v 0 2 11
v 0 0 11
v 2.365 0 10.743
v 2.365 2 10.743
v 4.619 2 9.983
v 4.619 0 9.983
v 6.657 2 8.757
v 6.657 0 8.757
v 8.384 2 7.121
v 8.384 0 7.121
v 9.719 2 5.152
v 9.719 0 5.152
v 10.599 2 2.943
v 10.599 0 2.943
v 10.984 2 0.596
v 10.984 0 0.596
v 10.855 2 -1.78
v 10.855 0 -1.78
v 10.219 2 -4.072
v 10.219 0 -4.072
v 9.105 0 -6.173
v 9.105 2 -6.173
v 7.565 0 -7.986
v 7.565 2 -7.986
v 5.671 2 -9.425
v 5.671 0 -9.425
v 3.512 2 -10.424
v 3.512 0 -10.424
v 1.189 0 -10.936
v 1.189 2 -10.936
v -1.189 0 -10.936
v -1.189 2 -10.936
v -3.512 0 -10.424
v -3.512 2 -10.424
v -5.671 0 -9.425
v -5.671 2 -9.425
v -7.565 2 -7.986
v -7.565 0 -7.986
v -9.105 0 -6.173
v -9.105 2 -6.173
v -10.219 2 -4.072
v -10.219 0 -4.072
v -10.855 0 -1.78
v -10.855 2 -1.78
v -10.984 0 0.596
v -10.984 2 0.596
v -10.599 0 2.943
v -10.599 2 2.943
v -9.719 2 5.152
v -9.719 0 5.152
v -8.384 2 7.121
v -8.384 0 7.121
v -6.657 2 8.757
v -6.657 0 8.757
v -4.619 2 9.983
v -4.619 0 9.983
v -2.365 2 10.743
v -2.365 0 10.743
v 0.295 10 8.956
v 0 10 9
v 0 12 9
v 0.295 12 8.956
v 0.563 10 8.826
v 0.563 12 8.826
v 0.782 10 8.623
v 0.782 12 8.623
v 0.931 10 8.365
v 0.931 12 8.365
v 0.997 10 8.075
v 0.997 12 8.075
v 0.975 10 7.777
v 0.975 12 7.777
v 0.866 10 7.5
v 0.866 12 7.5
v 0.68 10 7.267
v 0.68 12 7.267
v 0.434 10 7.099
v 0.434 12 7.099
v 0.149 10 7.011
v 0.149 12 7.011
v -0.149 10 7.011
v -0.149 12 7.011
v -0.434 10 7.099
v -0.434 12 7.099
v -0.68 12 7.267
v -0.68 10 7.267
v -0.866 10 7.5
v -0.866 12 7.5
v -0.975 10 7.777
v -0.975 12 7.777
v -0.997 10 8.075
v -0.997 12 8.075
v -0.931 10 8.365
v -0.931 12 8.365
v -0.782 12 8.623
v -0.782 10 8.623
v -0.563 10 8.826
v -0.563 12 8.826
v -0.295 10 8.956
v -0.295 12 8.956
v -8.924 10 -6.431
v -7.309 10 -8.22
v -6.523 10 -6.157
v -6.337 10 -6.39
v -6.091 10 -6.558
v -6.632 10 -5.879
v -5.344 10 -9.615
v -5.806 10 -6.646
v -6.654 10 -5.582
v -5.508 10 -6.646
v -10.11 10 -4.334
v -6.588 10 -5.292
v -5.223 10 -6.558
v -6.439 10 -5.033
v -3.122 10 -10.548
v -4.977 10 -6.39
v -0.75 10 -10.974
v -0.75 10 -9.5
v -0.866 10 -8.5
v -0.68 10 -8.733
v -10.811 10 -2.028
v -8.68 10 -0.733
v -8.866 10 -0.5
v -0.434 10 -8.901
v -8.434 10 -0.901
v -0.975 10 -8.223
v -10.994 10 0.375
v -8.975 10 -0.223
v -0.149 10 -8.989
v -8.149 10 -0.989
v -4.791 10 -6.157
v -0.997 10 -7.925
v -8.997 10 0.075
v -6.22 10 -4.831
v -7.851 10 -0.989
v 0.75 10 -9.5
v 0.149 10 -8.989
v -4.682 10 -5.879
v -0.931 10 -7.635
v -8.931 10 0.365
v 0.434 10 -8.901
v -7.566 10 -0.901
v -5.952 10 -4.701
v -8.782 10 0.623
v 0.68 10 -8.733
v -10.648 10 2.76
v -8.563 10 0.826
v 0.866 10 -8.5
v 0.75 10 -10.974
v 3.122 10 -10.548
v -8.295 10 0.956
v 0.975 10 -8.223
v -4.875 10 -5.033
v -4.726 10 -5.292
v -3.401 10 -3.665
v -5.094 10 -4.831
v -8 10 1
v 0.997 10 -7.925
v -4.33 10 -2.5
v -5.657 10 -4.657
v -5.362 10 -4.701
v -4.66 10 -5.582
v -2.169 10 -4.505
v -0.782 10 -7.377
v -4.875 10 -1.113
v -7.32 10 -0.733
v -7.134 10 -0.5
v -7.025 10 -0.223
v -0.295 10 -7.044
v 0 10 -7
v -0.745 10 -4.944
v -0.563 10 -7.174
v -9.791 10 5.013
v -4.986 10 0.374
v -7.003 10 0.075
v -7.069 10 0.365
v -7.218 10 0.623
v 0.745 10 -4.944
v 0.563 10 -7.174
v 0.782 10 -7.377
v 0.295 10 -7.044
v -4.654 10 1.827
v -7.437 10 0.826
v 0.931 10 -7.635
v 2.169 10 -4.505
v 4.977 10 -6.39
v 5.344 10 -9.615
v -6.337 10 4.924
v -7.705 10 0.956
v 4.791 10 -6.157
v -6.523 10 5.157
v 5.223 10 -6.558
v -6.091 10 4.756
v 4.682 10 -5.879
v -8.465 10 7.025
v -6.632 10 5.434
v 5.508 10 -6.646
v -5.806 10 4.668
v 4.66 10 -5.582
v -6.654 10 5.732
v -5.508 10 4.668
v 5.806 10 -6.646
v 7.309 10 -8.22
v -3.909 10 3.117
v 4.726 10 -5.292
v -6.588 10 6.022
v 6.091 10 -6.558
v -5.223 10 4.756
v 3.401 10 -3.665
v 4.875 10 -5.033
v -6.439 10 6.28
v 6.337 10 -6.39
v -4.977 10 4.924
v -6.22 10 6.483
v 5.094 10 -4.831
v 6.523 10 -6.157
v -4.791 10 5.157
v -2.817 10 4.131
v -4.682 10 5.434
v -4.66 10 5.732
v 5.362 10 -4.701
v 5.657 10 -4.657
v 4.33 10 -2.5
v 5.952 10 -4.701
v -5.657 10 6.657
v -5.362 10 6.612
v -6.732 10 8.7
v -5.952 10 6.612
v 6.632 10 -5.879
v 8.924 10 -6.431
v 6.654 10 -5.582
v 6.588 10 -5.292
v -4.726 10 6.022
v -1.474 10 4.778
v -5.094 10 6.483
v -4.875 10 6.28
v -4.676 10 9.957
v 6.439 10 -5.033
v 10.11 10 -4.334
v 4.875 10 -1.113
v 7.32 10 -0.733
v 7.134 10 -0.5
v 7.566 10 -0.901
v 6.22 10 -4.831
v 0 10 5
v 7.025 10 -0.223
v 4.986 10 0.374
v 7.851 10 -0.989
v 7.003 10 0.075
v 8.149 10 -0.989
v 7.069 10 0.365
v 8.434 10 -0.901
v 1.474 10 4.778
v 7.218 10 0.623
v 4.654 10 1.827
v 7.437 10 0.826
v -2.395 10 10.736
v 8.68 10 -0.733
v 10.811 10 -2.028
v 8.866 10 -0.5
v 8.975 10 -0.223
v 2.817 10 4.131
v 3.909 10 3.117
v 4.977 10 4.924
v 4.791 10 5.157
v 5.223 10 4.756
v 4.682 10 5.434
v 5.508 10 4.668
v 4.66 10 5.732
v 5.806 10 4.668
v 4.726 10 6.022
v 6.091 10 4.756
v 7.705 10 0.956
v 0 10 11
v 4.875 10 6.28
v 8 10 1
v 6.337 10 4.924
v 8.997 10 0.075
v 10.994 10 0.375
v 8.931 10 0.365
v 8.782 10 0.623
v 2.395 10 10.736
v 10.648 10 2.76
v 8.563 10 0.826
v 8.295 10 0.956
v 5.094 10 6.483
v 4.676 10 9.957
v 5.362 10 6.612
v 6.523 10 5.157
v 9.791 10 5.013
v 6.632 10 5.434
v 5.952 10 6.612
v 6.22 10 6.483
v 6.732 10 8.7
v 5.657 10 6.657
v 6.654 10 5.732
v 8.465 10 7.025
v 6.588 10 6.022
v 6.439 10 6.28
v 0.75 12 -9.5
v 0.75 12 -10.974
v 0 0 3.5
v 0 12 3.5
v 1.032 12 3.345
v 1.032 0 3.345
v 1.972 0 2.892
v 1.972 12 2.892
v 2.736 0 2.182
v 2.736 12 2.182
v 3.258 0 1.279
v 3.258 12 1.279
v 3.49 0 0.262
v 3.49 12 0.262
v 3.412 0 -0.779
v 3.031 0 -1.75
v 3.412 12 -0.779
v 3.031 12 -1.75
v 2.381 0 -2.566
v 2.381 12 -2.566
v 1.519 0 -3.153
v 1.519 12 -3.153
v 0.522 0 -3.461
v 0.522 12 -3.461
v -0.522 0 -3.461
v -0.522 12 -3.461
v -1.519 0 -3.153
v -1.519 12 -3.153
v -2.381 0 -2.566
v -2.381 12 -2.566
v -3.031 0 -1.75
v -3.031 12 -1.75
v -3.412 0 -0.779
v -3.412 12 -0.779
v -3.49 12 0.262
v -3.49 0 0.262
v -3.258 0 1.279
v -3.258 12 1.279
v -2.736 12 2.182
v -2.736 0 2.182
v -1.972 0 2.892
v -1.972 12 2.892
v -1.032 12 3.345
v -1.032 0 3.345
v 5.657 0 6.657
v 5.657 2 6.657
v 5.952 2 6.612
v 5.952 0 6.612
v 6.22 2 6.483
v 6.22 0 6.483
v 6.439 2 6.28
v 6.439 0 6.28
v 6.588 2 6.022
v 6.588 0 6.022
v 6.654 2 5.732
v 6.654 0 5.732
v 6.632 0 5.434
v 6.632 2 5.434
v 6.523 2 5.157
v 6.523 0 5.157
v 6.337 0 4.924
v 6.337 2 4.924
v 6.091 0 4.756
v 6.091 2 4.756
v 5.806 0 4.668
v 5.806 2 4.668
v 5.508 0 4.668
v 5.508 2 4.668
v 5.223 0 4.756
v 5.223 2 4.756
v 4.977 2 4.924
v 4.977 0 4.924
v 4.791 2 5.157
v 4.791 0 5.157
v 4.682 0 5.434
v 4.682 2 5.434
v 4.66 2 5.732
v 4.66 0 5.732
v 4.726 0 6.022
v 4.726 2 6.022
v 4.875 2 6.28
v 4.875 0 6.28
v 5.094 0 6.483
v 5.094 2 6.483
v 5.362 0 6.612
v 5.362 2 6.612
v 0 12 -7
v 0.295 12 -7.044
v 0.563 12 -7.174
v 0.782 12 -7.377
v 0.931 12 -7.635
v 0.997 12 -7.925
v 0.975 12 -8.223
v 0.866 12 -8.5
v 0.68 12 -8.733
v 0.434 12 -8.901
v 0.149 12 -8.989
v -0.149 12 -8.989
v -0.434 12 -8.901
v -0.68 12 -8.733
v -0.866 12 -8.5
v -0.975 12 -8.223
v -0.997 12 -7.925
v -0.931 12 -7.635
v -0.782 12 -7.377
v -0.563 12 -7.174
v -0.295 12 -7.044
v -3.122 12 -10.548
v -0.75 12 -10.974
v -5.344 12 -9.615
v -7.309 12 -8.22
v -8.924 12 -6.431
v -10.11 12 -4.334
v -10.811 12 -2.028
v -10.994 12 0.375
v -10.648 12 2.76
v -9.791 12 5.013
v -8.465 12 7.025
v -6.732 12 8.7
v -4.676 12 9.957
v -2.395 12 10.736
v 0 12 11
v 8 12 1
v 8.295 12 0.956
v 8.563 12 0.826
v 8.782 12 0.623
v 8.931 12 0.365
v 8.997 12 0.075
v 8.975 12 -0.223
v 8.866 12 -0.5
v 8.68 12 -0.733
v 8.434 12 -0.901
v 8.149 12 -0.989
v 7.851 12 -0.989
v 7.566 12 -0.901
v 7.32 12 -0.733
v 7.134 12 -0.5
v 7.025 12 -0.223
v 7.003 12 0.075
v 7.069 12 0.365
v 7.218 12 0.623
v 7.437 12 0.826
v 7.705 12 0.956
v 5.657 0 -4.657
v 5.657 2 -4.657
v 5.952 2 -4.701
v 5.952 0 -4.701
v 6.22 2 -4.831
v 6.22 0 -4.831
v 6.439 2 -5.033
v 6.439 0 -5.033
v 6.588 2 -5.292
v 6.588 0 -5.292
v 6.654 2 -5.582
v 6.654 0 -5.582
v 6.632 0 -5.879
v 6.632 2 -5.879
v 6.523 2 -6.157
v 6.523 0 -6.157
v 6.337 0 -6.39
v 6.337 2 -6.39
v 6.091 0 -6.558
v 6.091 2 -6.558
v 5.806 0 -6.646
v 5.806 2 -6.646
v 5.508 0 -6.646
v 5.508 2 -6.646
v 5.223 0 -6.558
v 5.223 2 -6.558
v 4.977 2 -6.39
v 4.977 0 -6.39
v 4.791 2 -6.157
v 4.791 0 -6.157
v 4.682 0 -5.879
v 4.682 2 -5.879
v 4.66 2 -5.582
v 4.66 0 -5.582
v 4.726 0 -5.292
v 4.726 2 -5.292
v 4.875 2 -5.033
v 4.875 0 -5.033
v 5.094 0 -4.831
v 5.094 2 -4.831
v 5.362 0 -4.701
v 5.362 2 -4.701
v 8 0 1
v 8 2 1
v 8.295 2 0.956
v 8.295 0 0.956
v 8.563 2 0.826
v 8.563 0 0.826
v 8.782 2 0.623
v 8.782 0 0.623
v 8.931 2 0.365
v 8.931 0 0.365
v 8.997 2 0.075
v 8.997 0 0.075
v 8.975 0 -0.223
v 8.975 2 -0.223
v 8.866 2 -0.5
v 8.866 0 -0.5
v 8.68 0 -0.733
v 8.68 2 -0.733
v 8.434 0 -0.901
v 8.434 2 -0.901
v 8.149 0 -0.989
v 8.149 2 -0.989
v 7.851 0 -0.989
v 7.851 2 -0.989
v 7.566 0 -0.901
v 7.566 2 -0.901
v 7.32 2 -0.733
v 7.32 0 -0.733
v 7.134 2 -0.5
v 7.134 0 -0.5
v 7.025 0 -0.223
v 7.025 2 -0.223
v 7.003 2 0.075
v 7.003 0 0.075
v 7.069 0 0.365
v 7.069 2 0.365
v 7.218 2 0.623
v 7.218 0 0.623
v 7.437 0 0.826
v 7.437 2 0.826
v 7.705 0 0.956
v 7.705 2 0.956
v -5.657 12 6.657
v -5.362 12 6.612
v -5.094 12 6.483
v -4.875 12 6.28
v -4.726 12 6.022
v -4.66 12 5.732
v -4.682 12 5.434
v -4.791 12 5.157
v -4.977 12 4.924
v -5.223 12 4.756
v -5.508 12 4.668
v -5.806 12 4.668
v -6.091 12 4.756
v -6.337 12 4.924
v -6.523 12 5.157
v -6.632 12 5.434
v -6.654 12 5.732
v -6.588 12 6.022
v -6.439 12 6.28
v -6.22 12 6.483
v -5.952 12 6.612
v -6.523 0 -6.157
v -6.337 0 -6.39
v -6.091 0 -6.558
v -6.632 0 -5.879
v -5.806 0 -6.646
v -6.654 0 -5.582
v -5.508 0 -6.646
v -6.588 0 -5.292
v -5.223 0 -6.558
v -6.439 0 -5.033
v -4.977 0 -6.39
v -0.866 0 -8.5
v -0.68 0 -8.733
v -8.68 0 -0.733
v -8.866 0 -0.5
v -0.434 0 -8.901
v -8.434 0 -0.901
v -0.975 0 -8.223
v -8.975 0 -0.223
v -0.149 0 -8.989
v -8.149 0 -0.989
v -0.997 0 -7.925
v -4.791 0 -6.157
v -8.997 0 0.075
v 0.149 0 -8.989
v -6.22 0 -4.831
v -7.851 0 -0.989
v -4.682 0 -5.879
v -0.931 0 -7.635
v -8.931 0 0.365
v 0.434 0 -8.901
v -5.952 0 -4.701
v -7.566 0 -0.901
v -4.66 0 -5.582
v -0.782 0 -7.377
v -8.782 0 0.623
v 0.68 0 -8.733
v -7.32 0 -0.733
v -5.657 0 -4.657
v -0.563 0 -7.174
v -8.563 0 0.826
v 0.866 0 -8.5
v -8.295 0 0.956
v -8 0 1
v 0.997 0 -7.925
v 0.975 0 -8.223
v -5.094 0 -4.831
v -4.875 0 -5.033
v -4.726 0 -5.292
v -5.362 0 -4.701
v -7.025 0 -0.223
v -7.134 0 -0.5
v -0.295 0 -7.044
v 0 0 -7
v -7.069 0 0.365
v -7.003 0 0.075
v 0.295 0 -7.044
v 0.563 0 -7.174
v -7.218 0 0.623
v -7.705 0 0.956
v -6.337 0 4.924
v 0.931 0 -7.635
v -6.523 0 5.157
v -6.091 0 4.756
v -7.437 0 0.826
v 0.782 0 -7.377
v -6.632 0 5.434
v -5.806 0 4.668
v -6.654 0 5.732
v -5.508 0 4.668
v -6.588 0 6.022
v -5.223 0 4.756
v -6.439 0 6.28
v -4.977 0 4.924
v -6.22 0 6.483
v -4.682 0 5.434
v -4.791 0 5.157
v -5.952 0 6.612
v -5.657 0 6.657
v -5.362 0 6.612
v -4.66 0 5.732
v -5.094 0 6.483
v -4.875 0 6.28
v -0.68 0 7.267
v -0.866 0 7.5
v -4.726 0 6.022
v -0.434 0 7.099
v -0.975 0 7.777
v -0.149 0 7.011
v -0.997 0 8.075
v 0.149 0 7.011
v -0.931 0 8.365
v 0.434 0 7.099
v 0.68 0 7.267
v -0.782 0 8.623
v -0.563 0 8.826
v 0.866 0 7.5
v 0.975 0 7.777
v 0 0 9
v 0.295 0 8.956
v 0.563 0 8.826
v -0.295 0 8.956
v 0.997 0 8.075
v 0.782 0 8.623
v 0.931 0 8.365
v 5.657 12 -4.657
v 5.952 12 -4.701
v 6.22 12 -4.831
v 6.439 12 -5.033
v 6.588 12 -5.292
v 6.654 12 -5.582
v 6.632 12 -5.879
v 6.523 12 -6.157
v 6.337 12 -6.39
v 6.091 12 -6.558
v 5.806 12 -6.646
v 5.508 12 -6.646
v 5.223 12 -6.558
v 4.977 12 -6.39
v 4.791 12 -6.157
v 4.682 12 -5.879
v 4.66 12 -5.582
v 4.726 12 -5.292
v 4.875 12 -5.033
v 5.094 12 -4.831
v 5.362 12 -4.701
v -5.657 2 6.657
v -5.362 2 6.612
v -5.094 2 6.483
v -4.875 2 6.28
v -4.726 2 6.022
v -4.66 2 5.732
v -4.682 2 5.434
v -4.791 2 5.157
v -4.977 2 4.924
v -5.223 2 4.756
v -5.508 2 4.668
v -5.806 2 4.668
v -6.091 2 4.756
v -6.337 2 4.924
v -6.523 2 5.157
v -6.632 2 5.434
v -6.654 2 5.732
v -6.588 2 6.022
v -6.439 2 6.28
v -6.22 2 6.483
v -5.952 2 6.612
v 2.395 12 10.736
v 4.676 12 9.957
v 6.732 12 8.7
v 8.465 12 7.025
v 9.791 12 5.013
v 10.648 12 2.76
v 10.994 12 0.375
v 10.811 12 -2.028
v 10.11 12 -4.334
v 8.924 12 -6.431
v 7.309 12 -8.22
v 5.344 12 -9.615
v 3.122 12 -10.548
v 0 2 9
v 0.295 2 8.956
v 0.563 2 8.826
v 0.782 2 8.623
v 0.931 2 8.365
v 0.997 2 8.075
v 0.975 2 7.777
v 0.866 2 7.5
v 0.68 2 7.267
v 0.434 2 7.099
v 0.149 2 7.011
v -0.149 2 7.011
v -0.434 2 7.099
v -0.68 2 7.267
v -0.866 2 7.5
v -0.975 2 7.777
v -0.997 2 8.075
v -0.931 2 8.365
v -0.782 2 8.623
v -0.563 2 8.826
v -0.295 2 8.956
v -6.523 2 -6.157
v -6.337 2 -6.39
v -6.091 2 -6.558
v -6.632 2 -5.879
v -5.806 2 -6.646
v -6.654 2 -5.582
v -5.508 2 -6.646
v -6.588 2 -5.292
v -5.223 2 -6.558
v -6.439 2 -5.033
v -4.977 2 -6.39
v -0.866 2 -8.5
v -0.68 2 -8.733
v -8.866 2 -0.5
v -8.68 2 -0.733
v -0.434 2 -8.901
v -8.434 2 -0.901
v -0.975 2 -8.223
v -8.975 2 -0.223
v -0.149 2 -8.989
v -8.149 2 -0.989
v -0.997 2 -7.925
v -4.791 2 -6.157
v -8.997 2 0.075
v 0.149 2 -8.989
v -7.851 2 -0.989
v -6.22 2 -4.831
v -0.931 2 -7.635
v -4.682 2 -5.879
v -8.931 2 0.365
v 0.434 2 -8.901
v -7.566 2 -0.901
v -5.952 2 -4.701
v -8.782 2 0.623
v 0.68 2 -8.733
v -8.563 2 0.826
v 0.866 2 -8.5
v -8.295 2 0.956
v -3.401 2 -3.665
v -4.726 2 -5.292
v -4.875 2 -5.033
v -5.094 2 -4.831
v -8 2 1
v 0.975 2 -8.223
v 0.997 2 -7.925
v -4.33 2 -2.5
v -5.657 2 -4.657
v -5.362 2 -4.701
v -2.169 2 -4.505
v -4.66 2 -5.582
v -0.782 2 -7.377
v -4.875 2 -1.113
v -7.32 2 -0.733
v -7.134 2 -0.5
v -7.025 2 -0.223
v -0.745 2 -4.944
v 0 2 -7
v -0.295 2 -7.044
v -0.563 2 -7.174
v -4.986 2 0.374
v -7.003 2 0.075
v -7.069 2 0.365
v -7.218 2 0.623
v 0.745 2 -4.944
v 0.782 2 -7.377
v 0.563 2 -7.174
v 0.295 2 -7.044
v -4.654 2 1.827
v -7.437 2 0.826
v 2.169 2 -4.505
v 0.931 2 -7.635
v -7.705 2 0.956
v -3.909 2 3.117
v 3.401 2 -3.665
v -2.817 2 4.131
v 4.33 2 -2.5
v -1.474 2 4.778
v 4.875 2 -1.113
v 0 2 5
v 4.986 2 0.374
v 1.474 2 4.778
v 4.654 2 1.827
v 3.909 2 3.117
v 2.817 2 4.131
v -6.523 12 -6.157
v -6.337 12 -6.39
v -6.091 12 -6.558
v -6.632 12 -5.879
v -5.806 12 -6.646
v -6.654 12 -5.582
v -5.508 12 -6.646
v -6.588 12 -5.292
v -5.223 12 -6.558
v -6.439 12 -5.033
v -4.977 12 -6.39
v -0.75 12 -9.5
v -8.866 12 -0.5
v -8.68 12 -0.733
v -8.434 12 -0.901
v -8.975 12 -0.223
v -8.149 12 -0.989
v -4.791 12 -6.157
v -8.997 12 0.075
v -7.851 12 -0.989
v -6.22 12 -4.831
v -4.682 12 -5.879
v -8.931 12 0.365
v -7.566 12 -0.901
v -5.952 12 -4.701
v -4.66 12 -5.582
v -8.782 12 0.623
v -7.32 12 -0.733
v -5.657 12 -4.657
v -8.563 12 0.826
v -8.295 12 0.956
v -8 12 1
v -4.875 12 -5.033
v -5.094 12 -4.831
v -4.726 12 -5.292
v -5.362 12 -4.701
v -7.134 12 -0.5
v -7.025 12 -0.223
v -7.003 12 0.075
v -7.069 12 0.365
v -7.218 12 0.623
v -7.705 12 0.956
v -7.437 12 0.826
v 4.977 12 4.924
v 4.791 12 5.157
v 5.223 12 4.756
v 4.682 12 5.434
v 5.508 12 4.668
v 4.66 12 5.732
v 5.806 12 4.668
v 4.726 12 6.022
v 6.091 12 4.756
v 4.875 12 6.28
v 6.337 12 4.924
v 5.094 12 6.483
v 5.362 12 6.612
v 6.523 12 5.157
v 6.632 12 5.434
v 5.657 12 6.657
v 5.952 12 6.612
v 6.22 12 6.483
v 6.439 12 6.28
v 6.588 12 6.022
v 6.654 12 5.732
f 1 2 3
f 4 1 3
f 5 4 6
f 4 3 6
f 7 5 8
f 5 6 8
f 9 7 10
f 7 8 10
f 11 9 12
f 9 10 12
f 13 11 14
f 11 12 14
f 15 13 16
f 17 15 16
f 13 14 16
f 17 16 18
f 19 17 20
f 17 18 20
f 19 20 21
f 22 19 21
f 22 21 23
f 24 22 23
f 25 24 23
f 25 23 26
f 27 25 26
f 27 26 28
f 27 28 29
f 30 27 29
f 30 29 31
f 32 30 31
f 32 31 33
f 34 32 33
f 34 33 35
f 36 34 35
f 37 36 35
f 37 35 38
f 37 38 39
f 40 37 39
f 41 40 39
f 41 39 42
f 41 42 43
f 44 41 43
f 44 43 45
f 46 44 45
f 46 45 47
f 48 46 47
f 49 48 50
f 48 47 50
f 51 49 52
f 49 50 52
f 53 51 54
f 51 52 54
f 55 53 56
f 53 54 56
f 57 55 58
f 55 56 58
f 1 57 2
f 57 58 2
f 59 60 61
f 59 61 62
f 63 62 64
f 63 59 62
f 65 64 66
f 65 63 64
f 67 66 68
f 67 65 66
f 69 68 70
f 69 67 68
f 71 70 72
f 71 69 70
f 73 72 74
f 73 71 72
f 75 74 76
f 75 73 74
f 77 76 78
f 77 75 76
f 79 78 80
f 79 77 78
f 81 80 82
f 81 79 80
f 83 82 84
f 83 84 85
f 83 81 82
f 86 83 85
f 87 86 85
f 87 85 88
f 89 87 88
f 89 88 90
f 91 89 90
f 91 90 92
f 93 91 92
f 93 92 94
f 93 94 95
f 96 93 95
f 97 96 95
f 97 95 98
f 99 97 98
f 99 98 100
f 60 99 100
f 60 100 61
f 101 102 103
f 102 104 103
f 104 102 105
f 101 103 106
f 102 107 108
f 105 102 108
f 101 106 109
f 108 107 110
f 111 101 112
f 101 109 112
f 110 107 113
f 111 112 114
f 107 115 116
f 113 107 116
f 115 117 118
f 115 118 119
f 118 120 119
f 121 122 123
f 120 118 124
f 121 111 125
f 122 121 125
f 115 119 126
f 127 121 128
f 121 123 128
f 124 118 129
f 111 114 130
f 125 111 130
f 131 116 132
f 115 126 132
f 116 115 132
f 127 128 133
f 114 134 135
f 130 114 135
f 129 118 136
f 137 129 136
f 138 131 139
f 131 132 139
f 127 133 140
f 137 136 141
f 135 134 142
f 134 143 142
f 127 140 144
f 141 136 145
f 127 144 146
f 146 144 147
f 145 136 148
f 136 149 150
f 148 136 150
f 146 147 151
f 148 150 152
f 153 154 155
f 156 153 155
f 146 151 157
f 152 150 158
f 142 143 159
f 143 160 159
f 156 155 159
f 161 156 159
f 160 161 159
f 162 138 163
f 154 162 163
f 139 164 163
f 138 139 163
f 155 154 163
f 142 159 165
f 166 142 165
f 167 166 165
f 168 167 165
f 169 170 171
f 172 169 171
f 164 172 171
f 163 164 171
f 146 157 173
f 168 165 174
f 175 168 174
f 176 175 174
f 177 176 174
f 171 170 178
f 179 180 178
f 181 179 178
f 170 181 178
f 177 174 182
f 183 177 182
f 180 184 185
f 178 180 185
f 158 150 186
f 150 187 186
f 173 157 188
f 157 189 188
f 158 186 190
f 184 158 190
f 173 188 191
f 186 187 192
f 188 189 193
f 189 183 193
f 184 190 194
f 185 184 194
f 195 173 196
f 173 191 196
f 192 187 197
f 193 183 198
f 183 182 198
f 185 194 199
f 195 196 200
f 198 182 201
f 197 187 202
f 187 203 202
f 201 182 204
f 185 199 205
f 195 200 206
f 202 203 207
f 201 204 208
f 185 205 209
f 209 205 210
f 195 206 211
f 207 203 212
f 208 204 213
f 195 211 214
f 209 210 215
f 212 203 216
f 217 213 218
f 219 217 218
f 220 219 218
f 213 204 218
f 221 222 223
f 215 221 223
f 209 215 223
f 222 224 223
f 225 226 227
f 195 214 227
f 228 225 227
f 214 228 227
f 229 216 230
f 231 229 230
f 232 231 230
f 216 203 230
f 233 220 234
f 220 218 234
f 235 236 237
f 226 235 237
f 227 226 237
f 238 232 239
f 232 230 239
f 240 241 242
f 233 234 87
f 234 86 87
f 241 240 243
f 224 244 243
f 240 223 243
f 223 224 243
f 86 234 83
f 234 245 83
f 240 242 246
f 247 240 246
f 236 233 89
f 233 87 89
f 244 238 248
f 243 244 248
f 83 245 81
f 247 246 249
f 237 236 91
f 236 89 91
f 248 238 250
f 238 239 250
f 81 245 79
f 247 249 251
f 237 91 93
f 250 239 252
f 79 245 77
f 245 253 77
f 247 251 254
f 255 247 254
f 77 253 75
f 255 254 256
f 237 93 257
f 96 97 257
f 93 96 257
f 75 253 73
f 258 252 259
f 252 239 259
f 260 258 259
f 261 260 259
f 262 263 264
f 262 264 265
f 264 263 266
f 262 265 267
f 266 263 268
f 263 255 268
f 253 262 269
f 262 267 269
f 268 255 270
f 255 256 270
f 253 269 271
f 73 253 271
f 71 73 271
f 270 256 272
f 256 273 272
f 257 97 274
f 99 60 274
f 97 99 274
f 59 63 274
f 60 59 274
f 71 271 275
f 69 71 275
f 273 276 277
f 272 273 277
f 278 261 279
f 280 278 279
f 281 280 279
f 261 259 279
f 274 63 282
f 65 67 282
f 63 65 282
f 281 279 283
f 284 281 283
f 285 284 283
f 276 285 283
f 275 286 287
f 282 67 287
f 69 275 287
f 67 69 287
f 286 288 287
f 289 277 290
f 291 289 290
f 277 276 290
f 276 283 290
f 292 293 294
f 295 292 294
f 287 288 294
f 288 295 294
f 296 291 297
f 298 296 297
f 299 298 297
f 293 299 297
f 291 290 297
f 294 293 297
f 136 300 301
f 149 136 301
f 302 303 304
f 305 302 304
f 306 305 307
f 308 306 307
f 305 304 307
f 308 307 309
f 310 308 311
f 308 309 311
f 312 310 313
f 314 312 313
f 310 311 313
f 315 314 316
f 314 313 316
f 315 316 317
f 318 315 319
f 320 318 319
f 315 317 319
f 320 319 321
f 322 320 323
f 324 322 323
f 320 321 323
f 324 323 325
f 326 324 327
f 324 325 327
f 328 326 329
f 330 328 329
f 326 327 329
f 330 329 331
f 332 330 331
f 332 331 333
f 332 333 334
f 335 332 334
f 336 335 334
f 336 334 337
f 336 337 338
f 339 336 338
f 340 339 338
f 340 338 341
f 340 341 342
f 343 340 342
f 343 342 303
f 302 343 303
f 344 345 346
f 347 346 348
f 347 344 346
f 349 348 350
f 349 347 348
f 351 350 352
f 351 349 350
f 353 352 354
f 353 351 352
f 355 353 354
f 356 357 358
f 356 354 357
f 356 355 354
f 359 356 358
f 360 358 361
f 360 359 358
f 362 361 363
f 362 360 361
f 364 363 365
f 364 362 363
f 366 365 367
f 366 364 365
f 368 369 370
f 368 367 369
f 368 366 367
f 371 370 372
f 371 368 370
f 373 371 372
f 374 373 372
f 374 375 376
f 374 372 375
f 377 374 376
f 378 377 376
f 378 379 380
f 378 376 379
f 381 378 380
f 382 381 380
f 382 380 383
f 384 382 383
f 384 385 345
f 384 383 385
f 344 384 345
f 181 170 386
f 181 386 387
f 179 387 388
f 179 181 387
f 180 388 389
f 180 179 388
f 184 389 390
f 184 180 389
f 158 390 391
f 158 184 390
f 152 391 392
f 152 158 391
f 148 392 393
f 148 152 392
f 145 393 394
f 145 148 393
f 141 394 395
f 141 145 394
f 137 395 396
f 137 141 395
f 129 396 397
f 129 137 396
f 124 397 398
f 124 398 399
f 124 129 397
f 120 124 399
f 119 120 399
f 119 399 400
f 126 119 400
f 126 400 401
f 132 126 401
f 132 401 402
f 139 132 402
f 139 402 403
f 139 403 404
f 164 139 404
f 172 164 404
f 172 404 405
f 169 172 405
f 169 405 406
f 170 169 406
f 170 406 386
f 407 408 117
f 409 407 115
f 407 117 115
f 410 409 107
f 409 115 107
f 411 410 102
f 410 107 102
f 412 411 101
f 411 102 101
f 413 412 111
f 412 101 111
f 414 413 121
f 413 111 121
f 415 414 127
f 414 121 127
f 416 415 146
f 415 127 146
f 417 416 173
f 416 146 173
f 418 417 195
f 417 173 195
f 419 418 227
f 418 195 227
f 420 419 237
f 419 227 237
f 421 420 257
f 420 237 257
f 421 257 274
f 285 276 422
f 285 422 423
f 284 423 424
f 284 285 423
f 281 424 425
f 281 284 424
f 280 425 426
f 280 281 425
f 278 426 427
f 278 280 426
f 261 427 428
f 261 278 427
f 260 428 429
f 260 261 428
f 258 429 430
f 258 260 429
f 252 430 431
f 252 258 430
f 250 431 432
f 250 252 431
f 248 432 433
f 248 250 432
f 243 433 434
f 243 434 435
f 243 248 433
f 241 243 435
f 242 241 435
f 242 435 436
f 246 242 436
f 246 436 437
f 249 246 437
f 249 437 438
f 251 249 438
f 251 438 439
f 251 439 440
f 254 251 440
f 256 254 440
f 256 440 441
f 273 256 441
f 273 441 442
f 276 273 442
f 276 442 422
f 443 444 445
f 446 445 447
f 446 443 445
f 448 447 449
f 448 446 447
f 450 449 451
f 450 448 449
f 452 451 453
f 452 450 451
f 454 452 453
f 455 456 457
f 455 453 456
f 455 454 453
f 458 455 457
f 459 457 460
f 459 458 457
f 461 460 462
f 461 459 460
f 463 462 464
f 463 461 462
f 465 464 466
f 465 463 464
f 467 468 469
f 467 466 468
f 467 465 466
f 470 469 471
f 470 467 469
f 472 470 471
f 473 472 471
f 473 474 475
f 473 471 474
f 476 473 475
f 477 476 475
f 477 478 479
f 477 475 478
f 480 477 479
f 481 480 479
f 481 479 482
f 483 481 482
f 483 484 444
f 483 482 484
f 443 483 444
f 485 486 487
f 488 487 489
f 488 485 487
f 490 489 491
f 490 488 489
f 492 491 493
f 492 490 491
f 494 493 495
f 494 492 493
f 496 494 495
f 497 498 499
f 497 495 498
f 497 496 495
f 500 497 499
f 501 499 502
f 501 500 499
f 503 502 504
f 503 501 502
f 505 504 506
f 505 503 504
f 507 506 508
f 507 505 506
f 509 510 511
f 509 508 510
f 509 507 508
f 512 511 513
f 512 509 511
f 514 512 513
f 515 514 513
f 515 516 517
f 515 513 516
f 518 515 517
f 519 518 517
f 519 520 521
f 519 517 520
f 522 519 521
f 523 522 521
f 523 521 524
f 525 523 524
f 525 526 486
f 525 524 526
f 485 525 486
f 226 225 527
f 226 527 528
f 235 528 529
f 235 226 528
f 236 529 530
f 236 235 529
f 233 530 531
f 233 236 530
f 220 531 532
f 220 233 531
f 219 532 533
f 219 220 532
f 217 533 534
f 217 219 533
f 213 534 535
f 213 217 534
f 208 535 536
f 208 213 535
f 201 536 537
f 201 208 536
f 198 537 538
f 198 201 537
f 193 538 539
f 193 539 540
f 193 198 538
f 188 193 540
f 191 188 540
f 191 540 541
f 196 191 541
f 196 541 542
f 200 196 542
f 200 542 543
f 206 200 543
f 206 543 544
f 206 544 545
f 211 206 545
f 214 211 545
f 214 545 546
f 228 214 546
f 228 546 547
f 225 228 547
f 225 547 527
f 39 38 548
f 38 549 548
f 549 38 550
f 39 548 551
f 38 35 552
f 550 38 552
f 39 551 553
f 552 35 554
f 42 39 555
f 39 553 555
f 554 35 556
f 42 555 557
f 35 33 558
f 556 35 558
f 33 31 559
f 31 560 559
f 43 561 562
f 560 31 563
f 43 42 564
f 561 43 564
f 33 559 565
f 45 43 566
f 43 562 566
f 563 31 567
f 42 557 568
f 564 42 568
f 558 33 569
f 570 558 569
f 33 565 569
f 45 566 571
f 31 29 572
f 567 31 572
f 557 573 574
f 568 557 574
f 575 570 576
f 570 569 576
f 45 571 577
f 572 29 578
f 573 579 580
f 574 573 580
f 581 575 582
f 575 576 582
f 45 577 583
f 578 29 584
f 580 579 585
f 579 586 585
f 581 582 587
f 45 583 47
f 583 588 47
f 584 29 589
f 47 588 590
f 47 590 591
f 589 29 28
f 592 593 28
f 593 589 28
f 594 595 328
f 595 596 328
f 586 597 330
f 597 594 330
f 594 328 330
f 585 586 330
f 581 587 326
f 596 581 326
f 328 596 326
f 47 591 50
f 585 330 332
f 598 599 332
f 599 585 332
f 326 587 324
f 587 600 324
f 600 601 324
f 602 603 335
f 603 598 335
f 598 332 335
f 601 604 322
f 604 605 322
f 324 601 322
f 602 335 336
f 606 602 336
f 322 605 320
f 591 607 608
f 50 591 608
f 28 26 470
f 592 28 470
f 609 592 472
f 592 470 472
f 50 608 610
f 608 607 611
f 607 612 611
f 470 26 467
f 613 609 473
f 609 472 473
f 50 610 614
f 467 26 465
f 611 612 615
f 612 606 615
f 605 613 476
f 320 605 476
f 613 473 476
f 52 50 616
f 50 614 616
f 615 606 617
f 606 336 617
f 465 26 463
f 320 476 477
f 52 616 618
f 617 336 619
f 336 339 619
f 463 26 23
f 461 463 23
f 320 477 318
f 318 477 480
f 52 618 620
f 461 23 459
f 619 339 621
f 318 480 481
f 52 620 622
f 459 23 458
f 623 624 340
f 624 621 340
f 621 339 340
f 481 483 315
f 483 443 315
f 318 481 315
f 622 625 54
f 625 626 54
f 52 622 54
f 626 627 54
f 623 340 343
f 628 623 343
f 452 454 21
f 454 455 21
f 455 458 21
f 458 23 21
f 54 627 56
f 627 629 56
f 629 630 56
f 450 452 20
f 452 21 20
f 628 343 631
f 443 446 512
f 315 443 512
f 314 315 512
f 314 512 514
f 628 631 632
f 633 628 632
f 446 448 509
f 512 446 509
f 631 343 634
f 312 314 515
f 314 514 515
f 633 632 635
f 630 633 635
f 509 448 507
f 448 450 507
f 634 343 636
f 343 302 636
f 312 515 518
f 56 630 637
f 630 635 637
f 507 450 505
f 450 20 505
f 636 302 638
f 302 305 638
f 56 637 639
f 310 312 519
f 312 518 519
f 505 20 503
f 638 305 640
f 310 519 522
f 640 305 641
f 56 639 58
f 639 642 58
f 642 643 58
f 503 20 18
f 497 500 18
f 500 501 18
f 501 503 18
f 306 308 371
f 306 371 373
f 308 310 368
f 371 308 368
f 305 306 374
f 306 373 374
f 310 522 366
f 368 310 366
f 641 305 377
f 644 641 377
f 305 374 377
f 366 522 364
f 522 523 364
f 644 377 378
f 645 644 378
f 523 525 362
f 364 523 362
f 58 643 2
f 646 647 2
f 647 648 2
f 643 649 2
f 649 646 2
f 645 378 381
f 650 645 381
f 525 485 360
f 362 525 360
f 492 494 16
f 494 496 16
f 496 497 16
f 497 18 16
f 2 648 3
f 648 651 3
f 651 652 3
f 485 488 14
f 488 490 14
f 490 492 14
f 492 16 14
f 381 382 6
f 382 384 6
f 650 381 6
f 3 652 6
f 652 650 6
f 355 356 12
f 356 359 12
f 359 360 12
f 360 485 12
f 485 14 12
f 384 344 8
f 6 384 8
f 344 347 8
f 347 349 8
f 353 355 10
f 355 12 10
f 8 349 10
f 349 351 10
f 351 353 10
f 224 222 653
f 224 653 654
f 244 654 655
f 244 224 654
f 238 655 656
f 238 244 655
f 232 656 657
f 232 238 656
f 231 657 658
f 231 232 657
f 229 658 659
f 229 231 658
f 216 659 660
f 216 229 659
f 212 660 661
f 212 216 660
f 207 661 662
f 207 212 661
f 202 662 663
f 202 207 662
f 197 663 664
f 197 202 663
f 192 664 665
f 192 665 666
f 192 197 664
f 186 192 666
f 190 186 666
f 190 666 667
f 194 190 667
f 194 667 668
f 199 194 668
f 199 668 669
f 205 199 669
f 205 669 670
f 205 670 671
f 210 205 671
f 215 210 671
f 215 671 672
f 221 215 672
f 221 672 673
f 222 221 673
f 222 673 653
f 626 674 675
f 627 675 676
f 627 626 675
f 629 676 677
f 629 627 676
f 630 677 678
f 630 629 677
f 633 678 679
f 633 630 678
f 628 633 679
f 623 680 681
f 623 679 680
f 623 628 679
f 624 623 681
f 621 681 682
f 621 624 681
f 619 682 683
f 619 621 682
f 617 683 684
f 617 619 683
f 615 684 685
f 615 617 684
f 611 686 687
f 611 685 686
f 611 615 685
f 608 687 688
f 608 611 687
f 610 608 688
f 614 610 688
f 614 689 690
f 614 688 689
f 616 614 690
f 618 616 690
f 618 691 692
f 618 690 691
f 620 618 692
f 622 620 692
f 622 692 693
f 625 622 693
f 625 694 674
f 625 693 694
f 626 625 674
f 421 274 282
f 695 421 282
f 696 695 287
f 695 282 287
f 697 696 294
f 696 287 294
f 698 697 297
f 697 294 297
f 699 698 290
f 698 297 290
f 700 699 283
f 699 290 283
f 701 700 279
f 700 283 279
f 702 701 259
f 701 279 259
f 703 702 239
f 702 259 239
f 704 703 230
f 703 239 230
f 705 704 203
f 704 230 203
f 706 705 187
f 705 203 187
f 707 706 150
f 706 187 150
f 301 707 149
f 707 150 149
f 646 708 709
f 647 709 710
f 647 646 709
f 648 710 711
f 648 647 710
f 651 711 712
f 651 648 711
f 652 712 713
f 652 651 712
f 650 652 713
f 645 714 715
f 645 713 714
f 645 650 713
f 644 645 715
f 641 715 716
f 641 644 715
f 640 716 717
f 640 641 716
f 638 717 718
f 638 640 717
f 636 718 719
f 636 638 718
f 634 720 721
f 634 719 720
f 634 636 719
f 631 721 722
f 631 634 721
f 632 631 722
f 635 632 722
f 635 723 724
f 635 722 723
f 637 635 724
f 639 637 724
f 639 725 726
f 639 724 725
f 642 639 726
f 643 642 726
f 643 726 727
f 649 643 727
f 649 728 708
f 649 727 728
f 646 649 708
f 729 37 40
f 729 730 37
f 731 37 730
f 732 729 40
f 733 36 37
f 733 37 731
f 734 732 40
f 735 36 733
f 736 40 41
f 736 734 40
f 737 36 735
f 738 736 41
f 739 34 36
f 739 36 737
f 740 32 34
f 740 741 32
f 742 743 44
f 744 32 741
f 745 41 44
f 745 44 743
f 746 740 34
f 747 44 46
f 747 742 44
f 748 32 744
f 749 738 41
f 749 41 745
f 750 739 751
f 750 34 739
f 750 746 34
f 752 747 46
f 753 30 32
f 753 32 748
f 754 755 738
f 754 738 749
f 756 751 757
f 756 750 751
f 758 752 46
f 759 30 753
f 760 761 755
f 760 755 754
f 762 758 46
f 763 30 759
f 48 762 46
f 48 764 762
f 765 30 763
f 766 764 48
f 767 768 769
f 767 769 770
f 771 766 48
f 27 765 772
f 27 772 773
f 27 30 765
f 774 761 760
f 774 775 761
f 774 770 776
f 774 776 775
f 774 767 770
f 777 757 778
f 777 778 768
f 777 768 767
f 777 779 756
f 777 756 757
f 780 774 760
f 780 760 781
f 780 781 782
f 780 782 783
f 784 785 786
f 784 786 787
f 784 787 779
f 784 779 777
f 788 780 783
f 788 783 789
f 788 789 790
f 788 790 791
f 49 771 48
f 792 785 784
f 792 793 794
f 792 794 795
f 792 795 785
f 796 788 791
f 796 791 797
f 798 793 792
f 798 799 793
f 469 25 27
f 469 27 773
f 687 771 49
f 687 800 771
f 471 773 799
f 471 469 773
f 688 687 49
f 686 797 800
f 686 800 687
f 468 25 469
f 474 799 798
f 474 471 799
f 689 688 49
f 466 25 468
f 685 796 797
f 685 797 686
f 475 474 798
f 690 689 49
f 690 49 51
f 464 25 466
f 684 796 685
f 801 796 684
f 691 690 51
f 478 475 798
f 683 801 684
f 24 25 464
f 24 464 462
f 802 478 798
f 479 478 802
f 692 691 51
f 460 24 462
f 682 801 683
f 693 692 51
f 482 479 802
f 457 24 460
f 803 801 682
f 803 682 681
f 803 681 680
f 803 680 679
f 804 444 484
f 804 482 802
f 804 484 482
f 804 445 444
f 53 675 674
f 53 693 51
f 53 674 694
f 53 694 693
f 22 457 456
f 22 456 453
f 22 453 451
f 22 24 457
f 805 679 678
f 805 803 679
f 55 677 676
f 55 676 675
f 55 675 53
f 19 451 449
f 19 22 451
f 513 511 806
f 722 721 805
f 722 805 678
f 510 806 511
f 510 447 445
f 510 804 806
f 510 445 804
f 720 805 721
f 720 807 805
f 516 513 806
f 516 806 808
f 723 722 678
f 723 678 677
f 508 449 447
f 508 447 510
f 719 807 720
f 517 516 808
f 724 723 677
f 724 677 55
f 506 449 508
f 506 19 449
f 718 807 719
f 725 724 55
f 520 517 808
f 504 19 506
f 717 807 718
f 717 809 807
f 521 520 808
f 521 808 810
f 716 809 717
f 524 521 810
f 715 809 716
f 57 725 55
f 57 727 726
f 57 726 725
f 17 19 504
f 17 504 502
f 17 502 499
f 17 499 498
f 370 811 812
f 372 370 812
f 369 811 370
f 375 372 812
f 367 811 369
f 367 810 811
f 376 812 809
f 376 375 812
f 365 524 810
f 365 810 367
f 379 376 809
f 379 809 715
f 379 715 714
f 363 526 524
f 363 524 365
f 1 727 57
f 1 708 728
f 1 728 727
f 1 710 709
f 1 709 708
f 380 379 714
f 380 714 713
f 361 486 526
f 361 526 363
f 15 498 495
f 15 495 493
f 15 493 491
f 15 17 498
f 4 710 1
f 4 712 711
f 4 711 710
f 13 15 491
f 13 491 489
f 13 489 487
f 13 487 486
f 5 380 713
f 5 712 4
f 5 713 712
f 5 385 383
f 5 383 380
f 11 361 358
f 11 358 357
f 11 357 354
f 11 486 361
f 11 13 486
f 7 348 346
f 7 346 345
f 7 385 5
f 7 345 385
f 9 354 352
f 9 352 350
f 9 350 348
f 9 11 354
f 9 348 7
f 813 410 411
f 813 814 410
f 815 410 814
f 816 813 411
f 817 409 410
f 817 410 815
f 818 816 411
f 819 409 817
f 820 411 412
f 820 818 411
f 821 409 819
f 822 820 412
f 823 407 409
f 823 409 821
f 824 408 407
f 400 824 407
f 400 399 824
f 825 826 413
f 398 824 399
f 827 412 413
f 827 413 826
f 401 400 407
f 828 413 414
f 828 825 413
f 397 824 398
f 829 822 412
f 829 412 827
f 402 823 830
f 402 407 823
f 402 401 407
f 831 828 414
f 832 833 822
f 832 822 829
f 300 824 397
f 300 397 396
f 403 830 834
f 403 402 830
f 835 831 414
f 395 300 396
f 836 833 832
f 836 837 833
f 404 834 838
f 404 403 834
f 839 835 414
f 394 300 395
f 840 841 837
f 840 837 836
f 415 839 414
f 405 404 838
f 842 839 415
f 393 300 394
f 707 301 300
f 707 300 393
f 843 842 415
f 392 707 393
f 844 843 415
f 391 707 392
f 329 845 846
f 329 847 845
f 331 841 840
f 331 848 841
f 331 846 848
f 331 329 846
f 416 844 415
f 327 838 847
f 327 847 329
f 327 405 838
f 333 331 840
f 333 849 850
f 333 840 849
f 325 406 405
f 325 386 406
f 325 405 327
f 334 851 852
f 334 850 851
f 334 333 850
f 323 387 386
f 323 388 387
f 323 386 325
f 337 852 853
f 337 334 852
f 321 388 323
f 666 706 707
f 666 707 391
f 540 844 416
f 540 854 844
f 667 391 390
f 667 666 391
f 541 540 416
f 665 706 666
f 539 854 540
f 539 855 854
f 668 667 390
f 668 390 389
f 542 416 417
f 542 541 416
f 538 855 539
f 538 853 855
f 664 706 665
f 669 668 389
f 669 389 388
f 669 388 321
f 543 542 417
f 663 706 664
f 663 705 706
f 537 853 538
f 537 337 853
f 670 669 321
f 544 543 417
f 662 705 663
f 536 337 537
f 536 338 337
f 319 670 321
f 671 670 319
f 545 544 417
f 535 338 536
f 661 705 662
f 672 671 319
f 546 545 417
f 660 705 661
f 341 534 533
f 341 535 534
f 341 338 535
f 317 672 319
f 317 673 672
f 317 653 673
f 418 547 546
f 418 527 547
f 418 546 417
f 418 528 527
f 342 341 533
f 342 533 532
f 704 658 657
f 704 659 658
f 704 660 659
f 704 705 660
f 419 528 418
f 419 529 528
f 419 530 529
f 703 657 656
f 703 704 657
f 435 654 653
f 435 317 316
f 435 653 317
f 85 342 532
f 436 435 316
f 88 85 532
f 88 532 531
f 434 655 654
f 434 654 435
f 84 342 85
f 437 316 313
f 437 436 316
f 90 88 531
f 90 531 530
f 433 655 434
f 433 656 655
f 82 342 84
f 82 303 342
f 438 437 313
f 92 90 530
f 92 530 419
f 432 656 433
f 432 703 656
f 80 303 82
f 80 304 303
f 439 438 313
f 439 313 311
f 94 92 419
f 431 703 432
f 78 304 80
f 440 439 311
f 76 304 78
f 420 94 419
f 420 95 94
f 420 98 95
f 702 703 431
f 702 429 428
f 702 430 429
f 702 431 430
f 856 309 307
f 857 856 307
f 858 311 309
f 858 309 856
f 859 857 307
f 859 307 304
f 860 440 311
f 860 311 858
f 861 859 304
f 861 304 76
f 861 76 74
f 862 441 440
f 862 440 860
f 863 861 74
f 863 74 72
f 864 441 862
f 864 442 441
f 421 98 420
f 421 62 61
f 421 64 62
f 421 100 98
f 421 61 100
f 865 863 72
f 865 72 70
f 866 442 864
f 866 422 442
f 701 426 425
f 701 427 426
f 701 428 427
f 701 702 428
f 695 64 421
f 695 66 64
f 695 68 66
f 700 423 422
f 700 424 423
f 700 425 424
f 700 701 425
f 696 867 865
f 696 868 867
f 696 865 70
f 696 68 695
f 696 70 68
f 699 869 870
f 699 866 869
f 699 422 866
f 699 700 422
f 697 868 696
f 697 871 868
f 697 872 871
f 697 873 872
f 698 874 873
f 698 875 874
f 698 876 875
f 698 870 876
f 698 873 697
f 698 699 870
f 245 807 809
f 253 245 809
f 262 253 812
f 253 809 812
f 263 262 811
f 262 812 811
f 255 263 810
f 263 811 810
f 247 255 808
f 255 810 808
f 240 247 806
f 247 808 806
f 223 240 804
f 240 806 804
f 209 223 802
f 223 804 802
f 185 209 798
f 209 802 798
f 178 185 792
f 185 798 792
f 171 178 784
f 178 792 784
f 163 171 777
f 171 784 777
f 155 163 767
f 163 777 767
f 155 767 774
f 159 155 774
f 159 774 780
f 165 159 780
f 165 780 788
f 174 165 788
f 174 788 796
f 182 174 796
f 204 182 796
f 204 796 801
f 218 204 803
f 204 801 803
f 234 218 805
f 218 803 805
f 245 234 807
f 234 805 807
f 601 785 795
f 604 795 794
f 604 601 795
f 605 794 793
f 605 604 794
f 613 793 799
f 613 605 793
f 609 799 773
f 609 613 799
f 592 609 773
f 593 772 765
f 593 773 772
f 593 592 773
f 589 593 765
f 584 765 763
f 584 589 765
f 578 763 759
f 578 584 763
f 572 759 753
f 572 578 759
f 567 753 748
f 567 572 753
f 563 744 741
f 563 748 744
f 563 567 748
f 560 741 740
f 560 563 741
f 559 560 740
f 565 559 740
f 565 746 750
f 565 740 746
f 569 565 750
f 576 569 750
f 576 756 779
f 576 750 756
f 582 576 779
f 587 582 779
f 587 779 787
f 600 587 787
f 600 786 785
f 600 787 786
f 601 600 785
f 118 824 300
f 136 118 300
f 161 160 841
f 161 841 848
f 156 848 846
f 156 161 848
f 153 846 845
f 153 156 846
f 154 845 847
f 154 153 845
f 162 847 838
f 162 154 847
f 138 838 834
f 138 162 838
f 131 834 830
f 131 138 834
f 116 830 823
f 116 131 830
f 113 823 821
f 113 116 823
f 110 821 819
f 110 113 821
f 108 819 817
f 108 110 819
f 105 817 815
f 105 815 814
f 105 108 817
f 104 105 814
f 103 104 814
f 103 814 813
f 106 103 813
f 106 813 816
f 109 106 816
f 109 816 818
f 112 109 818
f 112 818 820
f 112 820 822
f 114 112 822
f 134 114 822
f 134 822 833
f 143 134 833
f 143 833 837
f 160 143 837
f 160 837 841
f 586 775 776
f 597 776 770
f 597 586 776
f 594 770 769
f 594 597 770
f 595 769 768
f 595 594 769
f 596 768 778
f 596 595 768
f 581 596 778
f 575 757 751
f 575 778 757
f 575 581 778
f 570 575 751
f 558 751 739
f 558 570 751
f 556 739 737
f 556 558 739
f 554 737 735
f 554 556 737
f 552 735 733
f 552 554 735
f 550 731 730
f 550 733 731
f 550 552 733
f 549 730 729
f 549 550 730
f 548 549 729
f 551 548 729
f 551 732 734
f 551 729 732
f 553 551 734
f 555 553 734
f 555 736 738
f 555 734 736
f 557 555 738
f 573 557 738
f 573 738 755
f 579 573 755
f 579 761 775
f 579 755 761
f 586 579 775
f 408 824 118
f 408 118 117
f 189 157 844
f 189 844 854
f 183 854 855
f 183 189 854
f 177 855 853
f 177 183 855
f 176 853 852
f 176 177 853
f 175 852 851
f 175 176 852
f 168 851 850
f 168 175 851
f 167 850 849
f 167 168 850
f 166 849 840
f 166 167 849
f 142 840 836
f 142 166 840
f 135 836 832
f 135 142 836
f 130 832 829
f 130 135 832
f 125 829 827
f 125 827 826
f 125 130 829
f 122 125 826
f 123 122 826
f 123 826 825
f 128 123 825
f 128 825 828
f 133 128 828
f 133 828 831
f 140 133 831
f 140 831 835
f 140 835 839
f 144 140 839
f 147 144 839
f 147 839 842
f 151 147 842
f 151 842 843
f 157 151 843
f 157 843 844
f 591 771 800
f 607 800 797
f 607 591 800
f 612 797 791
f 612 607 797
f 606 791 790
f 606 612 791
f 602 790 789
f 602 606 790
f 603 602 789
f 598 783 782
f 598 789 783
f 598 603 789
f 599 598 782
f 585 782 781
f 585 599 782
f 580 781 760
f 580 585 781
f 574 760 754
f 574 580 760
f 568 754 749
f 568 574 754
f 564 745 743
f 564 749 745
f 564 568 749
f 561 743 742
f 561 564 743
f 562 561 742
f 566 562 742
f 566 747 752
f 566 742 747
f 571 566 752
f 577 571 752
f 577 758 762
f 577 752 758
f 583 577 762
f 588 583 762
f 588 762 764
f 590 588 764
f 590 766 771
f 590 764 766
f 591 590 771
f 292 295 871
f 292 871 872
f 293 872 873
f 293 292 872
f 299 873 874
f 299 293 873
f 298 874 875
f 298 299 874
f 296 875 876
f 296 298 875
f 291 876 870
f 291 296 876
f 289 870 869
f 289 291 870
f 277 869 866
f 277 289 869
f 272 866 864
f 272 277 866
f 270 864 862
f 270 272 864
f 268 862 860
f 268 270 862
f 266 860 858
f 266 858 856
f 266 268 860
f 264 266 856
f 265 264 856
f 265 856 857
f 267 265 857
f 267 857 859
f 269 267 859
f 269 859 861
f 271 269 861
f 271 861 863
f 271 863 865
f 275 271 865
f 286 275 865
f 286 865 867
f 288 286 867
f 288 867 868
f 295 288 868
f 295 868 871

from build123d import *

# Parameters (mm, degrees)
SKETCH1_R           = 11
SKETCH1_R_2         = 1
BOSS_EXTRUDE1_DEPTH = 12
SKETCH2_R           = 3.5
CUT_EXTRUDE1_DEPTH  = 20.646882704
CUT_EXTRUDE2_START  = -8
SKETCH3_R           = 11
SKETCH3_R_2         = 5
CUT_EXTRUDE2_DEPTH  = 8
SKETCH4_W           = 1.5
SKETCH4_H           = 3
CUT_EXTRUDE3_DEPTH  = 4


with BuildPart() as part:
    # Sketch1 → Boss-Extrude1 (new body)
    with BuildSketch(Plane(origin=(0, 0, 0), x_dir=(1, 0, 0), z_dir=(0, 1, 0))):
        with Locations(Location((0, 0, 0), (0, 0, 270))):
            Circle(SKETCH1_R)
        with Locations(Location((0, 8, 0), (0, 0, 270))):
            Circle(SKETCH1_R_2, mode=Mode.SUBTRACT)
        with Locations(Location((5.656854249, 5.656854249, 0), (0, 0, 270))):
            Circle(SKETCH1_R_2, mode=Mode.SUBTRACT)
        with Locations(Location((8, 0, 0), (0, 0, 270))):
            Circle(SKETCH1_R_2, mode=Mode.SUBTRACT)
        with Locations(Location((5.656854249, -5.656854249, 0), (0, 0, 270))):
            Circle(SKETCH1_R_2, mode=Mode.SUBTRACT)
        with Locations(Location((0, -8, 0), (0, 0, 270))):
            Circle(SKETCH1_R_2, mode=Mode.SUBTRACT)
        with Locations(Location((-5.656854249, -5.656854249, 0), (0, 0, 270))):
            Circle(SKETCH1_R_2, mode=Mode.SUBTRACT)
        with Locations(Location((-8, 0, 0), (0, 0, 270))):
            Circle(SKETCH1_R_2, mode=Mode.SUBTRACT)
        with Locations(Location((-5.656854249, 5.656854249, 0), (0, 0, 270))):
            Circle(SKETCH1_R_2, mode=Mode.SUBTRACT)
    extrude(amount=BOSS_EXTRUDE1_DEPTH)

    # Sketch2 → Cut-Extrude1 (cut, through all)
    with BuildSketch(Plane(origin=(0, 12, 0), x_dir=(1, 0, 0), z_dir=(0, 1, 0))):
        with Locations(Location((0, 0, 0), (0, 0, 270))):
            Circle(SKETCH2_R)
    extrude(amount=-CUT_EXTRUDE1_DEPTH, mode=Mode.SUBTRACT)

    # Sketch3 → Cut-Extrude2 (cut)
    with BuildSketch(Plane(origin=(0, 10, 0), x_dir=(1, 0, 0), z_dir=(0, 1, 0)).offset(CUT_EXTRUDE2_START)):
        with Locations(Location((0, 0, 0), (0, 0, 270))):
            Circle(SKETCH3_R)
        with Locations(Location((0, 0, 0), (0, 0, 270))):
            Circle(SKETCH3_R_2, mode=Mode.SUBTRACT)
    extrude(amount=CUT_EXTRUDE2_DEPTH, mode=Mode.SUBTRACT)

    # Sketch4 → Cut-Extrude3 (cut)
    with BuildSketch(Plane(origin=(0, 12, 0), x_dir=(1, 0, 0), z_dir=(0, 1, 0))):
        with Locations((0, 11)):
            Rectangle(SKETCH4_W, SKETCH4_H)
    extrude(amount=-CUT_EXTRUDE3_DEPTH, mode=Mode.SUBTRACT)


solid = part.part
